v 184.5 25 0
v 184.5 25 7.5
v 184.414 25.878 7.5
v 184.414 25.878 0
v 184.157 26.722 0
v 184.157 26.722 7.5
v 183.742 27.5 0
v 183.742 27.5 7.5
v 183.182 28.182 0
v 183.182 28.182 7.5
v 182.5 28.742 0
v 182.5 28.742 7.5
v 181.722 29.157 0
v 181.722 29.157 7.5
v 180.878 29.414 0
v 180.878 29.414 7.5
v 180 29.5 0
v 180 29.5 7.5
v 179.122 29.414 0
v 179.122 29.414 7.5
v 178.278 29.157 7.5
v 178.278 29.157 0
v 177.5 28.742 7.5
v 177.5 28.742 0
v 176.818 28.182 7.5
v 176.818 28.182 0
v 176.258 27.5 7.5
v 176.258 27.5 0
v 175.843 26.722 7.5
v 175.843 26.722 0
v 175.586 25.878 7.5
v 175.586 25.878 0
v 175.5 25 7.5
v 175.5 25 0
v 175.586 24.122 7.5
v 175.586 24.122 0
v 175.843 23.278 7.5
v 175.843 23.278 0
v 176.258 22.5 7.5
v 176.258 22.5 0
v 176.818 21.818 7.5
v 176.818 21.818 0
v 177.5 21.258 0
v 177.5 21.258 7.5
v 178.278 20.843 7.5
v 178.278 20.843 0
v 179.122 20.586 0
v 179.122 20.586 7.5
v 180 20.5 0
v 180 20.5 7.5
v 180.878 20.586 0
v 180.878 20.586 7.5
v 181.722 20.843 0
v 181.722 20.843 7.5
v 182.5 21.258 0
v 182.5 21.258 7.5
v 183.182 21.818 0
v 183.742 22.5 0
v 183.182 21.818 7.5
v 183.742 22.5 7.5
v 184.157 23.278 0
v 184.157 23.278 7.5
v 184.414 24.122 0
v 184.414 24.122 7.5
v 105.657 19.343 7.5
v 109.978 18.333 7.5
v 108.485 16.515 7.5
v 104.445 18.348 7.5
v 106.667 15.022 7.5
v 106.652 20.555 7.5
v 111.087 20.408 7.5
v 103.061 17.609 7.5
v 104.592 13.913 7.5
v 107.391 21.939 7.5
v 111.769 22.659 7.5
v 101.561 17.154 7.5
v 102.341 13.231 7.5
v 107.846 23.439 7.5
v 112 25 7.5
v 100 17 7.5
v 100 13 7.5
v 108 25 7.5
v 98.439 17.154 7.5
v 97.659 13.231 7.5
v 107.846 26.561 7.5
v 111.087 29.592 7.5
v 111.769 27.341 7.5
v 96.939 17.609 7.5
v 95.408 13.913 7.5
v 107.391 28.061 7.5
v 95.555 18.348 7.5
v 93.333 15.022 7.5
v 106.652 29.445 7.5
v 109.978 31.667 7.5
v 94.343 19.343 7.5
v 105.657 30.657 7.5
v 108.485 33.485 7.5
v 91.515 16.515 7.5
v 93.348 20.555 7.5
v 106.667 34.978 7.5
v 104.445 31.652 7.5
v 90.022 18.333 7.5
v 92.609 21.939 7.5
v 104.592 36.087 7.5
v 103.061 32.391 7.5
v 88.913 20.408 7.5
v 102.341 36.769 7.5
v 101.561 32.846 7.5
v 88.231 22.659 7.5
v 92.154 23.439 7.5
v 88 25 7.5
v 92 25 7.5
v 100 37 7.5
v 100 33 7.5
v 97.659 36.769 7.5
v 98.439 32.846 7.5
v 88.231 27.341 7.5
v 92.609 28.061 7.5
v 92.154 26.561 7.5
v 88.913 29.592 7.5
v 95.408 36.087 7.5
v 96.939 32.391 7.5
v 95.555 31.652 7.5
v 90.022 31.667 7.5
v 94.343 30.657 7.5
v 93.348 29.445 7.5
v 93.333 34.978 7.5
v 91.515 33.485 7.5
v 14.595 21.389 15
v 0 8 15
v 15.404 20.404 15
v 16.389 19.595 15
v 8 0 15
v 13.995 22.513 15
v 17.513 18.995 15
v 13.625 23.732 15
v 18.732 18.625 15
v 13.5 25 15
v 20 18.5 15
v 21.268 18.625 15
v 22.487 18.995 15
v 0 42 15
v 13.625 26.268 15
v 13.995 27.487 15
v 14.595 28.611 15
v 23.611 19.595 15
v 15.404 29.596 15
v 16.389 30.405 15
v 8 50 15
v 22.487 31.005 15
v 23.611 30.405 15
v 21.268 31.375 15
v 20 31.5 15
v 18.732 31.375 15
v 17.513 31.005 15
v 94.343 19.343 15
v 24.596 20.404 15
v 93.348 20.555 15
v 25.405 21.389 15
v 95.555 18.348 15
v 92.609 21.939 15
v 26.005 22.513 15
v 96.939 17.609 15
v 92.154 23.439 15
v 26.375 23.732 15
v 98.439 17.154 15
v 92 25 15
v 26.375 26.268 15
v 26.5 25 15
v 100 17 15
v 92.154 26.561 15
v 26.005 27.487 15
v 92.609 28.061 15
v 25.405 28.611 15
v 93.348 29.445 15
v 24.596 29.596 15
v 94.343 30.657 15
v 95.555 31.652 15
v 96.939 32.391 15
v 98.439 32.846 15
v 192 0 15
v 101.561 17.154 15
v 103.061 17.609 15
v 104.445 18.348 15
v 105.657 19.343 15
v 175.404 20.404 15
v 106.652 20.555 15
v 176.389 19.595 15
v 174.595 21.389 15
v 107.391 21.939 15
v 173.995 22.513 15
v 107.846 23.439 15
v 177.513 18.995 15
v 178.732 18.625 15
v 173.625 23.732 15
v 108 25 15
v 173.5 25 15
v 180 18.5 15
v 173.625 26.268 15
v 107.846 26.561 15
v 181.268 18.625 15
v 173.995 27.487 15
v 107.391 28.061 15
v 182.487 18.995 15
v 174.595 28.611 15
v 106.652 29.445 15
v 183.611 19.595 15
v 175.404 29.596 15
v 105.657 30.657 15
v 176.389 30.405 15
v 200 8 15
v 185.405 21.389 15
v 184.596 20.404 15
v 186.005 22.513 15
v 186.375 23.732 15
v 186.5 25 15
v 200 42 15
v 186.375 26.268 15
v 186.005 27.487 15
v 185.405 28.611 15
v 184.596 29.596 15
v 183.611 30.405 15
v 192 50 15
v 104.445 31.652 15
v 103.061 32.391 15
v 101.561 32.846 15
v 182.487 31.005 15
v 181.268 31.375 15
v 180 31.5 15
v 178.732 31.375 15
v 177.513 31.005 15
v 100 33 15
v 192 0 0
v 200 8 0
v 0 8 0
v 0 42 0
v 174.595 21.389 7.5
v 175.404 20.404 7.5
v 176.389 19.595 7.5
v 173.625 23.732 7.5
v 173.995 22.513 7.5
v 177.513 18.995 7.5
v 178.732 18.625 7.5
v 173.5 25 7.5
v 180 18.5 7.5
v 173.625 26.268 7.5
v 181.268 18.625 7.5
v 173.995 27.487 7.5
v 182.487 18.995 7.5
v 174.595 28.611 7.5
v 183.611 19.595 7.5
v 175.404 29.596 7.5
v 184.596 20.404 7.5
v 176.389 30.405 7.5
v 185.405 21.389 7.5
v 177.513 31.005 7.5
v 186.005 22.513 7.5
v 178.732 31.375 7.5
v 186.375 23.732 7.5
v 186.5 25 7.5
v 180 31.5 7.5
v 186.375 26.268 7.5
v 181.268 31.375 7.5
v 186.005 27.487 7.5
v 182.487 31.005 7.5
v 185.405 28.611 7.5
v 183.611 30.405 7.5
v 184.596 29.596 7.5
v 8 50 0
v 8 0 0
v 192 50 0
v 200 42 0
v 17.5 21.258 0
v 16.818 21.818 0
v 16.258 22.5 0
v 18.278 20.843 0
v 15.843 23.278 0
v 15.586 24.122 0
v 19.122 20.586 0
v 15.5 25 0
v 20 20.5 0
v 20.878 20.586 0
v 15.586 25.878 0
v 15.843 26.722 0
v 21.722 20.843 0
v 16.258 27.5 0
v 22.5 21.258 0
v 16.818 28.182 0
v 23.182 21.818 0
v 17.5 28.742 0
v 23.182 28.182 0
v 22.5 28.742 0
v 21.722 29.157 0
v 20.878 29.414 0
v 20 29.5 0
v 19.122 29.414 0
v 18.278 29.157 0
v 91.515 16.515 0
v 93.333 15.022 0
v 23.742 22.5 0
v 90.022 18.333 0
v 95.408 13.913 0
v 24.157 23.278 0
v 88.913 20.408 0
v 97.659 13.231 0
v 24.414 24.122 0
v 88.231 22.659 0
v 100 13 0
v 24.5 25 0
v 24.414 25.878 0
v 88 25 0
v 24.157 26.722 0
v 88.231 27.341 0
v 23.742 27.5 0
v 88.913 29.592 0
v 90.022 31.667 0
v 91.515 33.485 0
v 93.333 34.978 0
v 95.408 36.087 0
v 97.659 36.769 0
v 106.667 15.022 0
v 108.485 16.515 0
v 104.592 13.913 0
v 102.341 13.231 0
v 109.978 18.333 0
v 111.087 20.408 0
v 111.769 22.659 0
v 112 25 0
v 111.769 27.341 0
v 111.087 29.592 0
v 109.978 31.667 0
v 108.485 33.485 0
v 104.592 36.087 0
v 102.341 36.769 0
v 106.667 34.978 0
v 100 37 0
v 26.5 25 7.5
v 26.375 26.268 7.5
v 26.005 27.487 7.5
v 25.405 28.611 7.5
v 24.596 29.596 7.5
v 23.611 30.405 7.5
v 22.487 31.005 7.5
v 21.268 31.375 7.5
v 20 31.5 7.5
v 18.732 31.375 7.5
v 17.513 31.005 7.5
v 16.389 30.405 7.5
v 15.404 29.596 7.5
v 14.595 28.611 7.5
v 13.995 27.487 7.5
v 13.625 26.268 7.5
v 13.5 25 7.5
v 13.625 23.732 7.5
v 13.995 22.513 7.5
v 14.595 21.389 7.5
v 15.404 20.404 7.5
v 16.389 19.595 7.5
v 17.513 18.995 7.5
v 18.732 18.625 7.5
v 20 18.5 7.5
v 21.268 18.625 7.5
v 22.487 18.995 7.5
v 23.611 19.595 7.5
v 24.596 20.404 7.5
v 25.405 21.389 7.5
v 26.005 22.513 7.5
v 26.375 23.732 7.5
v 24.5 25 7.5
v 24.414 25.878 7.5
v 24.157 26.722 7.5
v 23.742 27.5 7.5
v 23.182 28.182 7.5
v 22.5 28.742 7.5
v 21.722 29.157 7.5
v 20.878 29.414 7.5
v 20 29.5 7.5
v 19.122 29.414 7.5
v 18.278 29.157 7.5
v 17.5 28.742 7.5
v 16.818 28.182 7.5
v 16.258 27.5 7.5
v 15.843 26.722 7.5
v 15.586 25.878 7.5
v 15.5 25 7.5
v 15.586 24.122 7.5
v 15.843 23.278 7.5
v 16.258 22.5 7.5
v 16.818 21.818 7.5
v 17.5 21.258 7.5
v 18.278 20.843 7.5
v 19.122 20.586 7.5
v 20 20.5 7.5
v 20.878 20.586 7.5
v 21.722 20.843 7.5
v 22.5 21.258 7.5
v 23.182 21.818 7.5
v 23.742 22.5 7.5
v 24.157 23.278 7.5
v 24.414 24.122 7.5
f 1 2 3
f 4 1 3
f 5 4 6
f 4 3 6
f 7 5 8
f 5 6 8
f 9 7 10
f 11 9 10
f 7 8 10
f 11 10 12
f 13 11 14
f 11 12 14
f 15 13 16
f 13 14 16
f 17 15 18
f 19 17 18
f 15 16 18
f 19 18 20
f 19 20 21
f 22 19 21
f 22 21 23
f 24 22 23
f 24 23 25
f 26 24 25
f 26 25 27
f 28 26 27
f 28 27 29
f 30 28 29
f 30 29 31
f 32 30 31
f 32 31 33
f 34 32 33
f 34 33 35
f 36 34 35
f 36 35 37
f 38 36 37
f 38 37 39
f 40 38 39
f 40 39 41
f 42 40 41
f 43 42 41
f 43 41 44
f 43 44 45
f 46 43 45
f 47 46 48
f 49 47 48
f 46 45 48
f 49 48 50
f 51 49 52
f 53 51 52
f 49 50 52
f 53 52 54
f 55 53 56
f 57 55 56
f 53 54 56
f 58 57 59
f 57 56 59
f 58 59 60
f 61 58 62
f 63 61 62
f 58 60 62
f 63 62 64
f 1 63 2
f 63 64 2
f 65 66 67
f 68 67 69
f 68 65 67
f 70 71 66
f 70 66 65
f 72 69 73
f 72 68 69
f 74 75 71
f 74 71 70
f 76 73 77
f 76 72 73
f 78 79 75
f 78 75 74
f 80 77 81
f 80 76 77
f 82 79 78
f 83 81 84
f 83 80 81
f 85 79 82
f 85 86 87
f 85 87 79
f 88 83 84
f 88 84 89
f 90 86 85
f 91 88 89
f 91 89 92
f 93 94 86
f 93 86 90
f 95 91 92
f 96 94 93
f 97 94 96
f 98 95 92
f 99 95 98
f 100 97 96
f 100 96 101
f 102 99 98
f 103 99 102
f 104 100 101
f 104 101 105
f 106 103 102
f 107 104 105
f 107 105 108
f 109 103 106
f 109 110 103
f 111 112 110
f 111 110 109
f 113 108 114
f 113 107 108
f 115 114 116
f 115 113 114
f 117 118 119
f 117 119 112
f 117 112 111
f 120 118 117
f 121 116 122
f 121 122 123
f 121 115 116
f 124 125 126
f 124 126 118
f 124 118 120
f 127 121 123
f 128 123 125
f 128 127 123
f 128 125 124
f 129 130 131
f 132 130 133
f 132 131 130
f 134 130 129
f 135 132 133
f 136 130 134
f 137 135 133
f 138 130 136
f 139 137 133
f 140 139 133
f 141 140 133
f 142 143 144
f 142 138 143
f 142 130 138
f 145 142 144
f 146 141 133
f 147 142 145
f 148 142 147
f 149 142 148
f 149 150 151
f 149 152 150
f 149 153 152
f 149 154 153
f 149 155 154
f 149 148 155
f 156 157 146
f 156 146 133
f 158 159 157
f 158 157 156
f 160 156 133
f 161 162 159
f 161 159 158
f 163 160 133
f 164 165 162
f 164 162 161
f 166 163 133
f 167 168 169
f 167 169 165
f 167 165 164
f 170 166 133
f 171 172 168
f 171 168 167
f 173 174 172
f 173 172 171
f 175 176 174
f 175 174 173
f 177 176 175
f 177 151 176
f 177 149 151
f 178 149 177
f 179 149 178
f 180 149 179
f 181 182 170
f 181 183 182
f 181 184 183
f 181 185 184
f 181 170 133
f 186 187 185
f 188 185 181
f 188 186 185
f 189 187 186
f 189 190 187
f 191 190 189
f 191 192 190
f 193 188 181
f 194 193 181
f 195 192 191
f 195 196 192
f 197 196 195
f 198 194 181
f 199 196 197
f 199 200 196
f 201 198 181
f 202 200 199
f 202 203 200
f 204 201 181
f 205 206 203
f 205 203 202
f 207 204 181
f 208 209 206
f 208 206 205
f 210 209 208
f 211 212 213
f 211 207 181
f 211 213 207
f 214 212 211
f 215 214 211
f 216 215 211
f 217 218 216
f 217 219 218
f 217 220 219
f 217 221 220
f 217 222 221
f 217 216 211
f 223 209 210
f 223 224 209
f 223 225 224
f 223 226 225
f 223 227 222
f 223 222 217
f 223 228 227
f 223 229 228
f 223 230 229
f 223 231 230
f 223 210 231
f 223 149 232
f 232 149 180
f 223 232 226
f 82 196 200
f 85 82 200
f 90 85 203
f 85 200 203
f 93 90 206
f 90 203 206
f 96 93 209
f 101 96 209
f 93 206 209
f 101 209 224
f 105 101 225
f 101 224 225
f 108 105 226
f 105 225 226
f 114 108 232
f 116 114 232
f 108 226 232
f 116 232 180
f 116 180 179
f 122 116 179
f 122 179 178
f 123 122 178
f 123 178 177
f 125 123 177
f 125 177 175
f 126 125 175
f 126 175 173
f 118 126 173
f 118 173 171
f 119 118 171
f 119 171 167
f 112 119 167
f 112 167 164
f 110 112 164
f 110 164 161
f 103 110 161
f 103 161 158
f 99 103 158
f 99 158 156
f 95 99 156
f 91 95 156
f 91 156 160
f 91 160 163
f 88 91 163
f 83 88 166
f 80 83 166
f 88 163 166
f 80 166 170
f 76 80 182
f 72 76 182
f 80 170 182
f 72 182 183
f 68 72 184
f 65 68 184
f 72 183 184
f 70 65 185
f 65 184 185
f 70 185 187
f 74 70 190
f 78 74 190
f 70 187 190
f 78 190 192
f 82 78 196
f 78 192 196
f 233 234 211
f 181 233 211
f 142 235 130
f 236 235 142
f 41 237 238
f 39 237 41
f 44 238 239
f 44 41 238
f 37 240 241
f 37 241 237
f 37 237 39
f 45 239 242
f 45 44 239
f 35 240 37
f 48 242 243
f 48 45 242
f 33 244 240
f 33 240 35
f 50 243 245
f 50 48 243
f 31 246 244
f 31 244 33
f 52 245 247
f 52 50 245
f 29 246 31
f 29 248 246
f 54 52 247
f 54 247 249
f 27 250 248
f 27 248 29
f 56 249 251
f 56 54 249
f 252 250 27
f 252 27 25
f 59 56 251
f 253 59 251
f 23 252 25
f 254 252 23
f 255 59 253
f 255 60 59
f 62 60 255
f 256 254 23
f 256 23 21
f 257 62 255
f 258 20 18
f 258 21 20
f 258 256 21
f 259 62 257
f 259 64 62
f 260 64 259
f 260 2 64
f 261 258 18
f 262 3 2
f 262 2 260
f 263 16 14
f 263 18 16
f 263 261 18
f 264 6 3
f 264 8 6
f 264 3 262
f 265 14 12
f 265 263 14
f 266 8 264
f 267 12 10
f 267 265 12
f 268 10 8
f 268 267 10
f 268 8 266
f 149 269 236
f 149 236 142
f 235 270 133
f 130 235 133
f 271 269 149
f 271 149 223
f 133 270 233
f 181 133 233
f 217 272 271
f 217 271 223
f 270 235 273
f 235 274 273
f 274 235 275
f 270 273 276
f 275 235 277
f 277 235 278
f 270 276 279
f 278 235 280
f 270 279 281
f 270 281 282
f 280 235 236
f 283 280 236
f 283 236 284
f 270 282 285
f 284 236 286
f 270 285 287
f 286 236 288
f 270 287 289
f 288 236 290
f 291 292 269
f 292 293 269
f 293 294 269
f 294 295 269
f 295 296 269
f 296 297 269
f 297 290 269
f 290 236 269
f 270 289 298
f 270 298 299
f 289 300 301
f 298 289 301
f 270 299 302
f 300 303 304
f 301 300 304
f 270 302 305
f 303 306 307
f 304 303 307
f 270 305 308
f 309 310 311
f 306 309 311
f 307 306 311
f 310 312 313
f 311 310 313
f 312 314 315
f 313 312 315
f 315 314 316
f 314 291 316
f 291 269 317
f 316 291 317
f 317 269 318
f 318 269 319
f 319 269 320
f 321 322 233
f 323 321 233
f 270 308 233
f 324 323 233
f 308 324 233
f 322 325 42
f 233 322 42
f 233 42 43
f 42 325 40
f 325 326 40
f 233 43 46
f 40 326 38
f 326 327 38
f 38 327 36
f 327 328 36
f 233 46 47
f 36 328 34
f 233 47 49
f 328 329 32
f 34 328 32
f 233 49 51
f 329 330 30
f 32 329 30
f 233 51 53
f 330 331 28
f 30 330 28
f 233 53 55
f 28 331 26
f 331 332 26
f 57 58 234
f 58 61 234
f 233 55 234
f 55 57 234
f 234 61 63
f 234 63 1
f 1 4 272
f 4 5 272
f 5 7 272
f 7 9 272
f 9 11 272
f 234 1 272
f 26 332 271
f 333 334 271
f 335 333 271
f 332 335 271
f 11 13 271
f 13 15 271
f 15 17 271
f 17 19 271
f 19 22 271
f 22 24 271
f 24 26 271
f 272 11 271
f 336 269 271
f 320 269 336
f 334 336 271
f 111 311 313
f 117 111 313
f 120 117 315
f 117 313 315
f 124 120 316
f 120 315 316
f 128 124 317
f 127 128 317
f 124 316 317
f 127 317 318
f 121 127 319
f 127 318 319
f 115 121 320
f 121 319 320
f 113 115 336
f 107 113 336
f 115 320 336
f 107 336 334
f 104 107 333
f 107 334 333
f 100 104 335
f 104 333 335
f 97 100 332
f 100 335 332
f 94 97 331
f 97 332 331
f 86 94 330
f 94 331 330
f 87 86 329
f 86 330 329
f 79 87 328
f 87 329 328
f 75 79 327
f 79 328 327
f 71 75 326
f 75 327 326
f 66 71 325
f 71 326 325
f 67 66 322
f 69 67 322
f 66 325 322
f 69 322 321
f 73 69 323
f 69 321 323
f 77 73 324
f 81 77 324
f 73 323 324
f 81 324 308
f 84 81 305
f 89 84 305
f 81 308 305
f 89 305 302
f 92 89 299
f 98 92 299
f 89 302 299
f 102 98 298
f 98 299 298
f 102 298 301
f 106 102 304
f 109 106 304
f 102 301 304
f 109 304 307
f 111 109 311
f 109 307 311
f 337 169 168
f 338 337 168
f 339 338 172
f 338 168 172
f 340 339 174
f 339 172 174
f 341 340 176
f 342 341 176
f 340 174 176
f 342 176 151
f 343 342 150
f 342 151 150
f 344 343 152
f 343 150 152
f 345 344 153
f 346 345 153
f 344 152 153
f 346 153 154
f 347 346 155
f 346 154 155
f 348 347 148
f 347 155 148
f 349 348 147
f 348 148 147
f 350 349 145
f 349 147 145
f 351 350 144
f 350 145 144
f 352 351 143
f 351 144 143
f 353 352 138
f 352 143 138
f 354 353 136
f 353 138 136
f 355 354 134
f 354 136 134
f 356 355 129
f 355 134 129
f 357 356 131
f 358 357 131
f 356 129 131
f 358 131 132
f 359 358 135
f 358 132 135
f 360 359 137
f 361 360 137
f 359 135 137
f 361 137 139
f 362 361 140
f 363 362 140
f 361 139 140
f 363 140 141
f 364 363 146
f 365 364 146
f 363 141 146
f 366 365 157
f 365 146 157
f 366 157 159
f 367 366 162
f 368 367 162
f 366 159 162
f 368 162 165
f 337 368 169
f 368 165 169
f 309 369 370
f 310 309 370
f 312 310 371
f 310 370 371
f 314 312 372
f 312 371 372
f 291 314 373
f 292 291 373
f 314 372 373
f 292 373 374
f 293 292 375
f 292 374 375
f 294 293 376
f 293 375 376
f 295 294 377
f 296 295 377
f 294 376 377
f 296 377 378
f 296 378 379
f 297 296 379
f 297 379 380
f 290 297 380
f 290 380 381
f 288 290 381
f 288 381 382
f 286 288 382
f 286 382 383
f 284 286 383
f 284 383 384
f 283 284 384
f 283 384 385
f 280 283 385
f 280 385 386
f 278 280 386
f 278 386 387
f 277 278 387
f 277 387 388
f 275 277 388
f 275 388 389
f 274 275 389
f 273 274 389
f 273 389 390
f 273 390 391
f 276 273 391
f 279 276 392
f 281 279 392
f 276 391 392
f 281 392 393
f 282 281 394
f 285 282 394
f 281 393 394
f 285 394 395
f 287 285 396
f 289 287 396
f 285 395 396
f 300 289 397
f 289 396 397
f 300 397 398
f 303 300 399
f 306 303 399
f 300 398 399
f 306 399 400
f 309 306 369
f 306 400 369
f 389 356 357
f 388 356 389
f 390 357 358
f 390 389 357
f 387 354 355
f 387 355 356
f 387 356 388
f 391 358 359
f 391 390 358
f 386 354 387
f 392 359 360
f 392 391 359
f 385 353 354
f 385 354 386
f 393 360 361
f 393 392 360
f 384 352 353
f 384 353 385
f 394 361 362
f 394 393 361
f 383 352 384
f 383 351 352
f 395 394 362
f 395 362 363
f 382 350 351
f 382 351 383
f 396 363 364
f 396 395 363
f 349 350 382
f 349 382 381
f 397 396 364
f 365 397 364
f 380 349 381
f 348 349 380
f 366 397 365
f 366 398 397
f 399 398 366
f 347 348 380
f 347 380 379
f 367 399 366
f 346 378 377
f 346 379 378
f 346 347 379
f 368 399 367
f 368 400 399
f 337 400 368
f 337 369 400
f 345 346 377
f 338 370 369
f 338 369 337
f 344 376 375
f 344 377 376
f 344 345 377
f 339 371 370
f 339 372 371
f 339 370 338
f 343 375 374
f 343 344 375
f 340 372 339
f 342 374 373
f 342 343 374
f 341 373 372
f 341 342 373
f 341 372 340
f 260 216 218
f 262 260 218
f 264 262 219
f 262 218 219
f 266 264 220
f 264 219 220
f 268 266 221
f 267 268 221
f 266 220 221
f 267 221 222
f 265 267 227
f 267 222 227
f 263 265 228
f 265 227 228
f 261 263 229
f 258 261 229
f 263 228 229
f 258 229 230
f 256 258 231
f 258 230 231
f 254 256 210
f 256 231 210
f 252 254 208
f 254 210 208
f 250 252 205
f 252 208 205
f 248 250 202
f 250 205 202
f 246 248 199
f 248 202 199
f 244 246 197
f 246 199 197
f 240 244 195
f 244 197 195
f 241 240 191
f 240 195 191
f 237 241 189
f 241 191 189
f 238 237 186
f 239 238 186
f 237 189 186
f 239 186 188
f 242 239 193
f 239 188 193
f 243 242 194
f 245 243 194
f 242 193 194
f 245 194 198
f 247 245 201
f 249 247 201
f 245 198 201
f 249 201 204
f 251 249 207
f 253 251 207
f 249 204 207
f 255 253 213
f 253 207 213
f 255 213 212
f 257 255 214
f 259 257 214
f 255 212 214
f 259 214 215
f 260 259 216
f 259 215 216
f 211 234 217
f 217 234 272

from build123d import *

# Parameters (mm, degrees)
SKETCH_1_W          = 200
SKETCH_1_H          = 50
EXTRUDE_1_DEPTH     = 15
SKETCH_2_R          = 4.5
SKETCH_2_R_2        = 8
CUT_EXTRUDE_1_DEPTH = 207.700266086
SKETCH_5_R          = 6.5
CUT_EXTRUDE_4_DEPTH = 7.5
SKETCH_6_R          = 12
CUT_EXTRUDE_5_DEPTH = 7.5
CHAMFER_1_SIZE      = 8


with BuildPart() as part:
    # 草图1 → 凸台-拉伸1 (new body)
    with BuildSketch(Plane.XY):
        with Locations((100, 25)):
            Rectangle(SKETCH_1_W, SKETCH_1_H)
    extrude(amount=EXTRUDE_1_DEPTH)

    # 草图2 → 切除-拉伸1 (cut, through all)
    with BuildSketch(Plane.XY.offset(15)):
        with Locations((20, 25)):
            Circle(SKETCH_2_R)
        with Locations((100, 25)):
            Circle(SKETCH_2_R_2)
        with Locations((180, 25)):
            Circle(SKETCH_2_R)
    extrude(amount=-CUT_EXTRUDE_1_DEPTH, mode=Mode.SUBTRACT)

    # 草图5 → 切除-拉伸4 (cut)
    with BuildSketch(Plane.XY.offset(15)):
        with Locations((20, 25)):
            Circle(SKETCH_5_R)
        with Locations((180, 25)):
            Circle(SKETCH_5_R)
    extrude(amount=-CUT_EXTRUDE_4_DEPTH, mode=Mode.SUBTRACT)

    # 草图6 → 切除-拉伸5 (cut)
    with BuildSketch(Plane(origin=(0, 0, 0), x_dir=(-1, 0, 0), z_dir=(0, 0, -1))):
        with Locations((-100, 25)):
            Circle(SKETCH_6_R)
    extrude(amount=-CUT_EXTRUDE_5_DEPTH, mode=Mode.SUBTRACT)

    # 倒角1
    chamfer_1_edges = [part.edges().sort_by_distance(p)[0] for p in [
        (0, 50, 7.5),
        (200, 50, 7.5),
        (200, 0, 7.5),
        (0, 0, 7.5),
    ]]
    chamfer(chamfer_1_edges, length=CHAMFER_1_SIZE)


solid = part.part
